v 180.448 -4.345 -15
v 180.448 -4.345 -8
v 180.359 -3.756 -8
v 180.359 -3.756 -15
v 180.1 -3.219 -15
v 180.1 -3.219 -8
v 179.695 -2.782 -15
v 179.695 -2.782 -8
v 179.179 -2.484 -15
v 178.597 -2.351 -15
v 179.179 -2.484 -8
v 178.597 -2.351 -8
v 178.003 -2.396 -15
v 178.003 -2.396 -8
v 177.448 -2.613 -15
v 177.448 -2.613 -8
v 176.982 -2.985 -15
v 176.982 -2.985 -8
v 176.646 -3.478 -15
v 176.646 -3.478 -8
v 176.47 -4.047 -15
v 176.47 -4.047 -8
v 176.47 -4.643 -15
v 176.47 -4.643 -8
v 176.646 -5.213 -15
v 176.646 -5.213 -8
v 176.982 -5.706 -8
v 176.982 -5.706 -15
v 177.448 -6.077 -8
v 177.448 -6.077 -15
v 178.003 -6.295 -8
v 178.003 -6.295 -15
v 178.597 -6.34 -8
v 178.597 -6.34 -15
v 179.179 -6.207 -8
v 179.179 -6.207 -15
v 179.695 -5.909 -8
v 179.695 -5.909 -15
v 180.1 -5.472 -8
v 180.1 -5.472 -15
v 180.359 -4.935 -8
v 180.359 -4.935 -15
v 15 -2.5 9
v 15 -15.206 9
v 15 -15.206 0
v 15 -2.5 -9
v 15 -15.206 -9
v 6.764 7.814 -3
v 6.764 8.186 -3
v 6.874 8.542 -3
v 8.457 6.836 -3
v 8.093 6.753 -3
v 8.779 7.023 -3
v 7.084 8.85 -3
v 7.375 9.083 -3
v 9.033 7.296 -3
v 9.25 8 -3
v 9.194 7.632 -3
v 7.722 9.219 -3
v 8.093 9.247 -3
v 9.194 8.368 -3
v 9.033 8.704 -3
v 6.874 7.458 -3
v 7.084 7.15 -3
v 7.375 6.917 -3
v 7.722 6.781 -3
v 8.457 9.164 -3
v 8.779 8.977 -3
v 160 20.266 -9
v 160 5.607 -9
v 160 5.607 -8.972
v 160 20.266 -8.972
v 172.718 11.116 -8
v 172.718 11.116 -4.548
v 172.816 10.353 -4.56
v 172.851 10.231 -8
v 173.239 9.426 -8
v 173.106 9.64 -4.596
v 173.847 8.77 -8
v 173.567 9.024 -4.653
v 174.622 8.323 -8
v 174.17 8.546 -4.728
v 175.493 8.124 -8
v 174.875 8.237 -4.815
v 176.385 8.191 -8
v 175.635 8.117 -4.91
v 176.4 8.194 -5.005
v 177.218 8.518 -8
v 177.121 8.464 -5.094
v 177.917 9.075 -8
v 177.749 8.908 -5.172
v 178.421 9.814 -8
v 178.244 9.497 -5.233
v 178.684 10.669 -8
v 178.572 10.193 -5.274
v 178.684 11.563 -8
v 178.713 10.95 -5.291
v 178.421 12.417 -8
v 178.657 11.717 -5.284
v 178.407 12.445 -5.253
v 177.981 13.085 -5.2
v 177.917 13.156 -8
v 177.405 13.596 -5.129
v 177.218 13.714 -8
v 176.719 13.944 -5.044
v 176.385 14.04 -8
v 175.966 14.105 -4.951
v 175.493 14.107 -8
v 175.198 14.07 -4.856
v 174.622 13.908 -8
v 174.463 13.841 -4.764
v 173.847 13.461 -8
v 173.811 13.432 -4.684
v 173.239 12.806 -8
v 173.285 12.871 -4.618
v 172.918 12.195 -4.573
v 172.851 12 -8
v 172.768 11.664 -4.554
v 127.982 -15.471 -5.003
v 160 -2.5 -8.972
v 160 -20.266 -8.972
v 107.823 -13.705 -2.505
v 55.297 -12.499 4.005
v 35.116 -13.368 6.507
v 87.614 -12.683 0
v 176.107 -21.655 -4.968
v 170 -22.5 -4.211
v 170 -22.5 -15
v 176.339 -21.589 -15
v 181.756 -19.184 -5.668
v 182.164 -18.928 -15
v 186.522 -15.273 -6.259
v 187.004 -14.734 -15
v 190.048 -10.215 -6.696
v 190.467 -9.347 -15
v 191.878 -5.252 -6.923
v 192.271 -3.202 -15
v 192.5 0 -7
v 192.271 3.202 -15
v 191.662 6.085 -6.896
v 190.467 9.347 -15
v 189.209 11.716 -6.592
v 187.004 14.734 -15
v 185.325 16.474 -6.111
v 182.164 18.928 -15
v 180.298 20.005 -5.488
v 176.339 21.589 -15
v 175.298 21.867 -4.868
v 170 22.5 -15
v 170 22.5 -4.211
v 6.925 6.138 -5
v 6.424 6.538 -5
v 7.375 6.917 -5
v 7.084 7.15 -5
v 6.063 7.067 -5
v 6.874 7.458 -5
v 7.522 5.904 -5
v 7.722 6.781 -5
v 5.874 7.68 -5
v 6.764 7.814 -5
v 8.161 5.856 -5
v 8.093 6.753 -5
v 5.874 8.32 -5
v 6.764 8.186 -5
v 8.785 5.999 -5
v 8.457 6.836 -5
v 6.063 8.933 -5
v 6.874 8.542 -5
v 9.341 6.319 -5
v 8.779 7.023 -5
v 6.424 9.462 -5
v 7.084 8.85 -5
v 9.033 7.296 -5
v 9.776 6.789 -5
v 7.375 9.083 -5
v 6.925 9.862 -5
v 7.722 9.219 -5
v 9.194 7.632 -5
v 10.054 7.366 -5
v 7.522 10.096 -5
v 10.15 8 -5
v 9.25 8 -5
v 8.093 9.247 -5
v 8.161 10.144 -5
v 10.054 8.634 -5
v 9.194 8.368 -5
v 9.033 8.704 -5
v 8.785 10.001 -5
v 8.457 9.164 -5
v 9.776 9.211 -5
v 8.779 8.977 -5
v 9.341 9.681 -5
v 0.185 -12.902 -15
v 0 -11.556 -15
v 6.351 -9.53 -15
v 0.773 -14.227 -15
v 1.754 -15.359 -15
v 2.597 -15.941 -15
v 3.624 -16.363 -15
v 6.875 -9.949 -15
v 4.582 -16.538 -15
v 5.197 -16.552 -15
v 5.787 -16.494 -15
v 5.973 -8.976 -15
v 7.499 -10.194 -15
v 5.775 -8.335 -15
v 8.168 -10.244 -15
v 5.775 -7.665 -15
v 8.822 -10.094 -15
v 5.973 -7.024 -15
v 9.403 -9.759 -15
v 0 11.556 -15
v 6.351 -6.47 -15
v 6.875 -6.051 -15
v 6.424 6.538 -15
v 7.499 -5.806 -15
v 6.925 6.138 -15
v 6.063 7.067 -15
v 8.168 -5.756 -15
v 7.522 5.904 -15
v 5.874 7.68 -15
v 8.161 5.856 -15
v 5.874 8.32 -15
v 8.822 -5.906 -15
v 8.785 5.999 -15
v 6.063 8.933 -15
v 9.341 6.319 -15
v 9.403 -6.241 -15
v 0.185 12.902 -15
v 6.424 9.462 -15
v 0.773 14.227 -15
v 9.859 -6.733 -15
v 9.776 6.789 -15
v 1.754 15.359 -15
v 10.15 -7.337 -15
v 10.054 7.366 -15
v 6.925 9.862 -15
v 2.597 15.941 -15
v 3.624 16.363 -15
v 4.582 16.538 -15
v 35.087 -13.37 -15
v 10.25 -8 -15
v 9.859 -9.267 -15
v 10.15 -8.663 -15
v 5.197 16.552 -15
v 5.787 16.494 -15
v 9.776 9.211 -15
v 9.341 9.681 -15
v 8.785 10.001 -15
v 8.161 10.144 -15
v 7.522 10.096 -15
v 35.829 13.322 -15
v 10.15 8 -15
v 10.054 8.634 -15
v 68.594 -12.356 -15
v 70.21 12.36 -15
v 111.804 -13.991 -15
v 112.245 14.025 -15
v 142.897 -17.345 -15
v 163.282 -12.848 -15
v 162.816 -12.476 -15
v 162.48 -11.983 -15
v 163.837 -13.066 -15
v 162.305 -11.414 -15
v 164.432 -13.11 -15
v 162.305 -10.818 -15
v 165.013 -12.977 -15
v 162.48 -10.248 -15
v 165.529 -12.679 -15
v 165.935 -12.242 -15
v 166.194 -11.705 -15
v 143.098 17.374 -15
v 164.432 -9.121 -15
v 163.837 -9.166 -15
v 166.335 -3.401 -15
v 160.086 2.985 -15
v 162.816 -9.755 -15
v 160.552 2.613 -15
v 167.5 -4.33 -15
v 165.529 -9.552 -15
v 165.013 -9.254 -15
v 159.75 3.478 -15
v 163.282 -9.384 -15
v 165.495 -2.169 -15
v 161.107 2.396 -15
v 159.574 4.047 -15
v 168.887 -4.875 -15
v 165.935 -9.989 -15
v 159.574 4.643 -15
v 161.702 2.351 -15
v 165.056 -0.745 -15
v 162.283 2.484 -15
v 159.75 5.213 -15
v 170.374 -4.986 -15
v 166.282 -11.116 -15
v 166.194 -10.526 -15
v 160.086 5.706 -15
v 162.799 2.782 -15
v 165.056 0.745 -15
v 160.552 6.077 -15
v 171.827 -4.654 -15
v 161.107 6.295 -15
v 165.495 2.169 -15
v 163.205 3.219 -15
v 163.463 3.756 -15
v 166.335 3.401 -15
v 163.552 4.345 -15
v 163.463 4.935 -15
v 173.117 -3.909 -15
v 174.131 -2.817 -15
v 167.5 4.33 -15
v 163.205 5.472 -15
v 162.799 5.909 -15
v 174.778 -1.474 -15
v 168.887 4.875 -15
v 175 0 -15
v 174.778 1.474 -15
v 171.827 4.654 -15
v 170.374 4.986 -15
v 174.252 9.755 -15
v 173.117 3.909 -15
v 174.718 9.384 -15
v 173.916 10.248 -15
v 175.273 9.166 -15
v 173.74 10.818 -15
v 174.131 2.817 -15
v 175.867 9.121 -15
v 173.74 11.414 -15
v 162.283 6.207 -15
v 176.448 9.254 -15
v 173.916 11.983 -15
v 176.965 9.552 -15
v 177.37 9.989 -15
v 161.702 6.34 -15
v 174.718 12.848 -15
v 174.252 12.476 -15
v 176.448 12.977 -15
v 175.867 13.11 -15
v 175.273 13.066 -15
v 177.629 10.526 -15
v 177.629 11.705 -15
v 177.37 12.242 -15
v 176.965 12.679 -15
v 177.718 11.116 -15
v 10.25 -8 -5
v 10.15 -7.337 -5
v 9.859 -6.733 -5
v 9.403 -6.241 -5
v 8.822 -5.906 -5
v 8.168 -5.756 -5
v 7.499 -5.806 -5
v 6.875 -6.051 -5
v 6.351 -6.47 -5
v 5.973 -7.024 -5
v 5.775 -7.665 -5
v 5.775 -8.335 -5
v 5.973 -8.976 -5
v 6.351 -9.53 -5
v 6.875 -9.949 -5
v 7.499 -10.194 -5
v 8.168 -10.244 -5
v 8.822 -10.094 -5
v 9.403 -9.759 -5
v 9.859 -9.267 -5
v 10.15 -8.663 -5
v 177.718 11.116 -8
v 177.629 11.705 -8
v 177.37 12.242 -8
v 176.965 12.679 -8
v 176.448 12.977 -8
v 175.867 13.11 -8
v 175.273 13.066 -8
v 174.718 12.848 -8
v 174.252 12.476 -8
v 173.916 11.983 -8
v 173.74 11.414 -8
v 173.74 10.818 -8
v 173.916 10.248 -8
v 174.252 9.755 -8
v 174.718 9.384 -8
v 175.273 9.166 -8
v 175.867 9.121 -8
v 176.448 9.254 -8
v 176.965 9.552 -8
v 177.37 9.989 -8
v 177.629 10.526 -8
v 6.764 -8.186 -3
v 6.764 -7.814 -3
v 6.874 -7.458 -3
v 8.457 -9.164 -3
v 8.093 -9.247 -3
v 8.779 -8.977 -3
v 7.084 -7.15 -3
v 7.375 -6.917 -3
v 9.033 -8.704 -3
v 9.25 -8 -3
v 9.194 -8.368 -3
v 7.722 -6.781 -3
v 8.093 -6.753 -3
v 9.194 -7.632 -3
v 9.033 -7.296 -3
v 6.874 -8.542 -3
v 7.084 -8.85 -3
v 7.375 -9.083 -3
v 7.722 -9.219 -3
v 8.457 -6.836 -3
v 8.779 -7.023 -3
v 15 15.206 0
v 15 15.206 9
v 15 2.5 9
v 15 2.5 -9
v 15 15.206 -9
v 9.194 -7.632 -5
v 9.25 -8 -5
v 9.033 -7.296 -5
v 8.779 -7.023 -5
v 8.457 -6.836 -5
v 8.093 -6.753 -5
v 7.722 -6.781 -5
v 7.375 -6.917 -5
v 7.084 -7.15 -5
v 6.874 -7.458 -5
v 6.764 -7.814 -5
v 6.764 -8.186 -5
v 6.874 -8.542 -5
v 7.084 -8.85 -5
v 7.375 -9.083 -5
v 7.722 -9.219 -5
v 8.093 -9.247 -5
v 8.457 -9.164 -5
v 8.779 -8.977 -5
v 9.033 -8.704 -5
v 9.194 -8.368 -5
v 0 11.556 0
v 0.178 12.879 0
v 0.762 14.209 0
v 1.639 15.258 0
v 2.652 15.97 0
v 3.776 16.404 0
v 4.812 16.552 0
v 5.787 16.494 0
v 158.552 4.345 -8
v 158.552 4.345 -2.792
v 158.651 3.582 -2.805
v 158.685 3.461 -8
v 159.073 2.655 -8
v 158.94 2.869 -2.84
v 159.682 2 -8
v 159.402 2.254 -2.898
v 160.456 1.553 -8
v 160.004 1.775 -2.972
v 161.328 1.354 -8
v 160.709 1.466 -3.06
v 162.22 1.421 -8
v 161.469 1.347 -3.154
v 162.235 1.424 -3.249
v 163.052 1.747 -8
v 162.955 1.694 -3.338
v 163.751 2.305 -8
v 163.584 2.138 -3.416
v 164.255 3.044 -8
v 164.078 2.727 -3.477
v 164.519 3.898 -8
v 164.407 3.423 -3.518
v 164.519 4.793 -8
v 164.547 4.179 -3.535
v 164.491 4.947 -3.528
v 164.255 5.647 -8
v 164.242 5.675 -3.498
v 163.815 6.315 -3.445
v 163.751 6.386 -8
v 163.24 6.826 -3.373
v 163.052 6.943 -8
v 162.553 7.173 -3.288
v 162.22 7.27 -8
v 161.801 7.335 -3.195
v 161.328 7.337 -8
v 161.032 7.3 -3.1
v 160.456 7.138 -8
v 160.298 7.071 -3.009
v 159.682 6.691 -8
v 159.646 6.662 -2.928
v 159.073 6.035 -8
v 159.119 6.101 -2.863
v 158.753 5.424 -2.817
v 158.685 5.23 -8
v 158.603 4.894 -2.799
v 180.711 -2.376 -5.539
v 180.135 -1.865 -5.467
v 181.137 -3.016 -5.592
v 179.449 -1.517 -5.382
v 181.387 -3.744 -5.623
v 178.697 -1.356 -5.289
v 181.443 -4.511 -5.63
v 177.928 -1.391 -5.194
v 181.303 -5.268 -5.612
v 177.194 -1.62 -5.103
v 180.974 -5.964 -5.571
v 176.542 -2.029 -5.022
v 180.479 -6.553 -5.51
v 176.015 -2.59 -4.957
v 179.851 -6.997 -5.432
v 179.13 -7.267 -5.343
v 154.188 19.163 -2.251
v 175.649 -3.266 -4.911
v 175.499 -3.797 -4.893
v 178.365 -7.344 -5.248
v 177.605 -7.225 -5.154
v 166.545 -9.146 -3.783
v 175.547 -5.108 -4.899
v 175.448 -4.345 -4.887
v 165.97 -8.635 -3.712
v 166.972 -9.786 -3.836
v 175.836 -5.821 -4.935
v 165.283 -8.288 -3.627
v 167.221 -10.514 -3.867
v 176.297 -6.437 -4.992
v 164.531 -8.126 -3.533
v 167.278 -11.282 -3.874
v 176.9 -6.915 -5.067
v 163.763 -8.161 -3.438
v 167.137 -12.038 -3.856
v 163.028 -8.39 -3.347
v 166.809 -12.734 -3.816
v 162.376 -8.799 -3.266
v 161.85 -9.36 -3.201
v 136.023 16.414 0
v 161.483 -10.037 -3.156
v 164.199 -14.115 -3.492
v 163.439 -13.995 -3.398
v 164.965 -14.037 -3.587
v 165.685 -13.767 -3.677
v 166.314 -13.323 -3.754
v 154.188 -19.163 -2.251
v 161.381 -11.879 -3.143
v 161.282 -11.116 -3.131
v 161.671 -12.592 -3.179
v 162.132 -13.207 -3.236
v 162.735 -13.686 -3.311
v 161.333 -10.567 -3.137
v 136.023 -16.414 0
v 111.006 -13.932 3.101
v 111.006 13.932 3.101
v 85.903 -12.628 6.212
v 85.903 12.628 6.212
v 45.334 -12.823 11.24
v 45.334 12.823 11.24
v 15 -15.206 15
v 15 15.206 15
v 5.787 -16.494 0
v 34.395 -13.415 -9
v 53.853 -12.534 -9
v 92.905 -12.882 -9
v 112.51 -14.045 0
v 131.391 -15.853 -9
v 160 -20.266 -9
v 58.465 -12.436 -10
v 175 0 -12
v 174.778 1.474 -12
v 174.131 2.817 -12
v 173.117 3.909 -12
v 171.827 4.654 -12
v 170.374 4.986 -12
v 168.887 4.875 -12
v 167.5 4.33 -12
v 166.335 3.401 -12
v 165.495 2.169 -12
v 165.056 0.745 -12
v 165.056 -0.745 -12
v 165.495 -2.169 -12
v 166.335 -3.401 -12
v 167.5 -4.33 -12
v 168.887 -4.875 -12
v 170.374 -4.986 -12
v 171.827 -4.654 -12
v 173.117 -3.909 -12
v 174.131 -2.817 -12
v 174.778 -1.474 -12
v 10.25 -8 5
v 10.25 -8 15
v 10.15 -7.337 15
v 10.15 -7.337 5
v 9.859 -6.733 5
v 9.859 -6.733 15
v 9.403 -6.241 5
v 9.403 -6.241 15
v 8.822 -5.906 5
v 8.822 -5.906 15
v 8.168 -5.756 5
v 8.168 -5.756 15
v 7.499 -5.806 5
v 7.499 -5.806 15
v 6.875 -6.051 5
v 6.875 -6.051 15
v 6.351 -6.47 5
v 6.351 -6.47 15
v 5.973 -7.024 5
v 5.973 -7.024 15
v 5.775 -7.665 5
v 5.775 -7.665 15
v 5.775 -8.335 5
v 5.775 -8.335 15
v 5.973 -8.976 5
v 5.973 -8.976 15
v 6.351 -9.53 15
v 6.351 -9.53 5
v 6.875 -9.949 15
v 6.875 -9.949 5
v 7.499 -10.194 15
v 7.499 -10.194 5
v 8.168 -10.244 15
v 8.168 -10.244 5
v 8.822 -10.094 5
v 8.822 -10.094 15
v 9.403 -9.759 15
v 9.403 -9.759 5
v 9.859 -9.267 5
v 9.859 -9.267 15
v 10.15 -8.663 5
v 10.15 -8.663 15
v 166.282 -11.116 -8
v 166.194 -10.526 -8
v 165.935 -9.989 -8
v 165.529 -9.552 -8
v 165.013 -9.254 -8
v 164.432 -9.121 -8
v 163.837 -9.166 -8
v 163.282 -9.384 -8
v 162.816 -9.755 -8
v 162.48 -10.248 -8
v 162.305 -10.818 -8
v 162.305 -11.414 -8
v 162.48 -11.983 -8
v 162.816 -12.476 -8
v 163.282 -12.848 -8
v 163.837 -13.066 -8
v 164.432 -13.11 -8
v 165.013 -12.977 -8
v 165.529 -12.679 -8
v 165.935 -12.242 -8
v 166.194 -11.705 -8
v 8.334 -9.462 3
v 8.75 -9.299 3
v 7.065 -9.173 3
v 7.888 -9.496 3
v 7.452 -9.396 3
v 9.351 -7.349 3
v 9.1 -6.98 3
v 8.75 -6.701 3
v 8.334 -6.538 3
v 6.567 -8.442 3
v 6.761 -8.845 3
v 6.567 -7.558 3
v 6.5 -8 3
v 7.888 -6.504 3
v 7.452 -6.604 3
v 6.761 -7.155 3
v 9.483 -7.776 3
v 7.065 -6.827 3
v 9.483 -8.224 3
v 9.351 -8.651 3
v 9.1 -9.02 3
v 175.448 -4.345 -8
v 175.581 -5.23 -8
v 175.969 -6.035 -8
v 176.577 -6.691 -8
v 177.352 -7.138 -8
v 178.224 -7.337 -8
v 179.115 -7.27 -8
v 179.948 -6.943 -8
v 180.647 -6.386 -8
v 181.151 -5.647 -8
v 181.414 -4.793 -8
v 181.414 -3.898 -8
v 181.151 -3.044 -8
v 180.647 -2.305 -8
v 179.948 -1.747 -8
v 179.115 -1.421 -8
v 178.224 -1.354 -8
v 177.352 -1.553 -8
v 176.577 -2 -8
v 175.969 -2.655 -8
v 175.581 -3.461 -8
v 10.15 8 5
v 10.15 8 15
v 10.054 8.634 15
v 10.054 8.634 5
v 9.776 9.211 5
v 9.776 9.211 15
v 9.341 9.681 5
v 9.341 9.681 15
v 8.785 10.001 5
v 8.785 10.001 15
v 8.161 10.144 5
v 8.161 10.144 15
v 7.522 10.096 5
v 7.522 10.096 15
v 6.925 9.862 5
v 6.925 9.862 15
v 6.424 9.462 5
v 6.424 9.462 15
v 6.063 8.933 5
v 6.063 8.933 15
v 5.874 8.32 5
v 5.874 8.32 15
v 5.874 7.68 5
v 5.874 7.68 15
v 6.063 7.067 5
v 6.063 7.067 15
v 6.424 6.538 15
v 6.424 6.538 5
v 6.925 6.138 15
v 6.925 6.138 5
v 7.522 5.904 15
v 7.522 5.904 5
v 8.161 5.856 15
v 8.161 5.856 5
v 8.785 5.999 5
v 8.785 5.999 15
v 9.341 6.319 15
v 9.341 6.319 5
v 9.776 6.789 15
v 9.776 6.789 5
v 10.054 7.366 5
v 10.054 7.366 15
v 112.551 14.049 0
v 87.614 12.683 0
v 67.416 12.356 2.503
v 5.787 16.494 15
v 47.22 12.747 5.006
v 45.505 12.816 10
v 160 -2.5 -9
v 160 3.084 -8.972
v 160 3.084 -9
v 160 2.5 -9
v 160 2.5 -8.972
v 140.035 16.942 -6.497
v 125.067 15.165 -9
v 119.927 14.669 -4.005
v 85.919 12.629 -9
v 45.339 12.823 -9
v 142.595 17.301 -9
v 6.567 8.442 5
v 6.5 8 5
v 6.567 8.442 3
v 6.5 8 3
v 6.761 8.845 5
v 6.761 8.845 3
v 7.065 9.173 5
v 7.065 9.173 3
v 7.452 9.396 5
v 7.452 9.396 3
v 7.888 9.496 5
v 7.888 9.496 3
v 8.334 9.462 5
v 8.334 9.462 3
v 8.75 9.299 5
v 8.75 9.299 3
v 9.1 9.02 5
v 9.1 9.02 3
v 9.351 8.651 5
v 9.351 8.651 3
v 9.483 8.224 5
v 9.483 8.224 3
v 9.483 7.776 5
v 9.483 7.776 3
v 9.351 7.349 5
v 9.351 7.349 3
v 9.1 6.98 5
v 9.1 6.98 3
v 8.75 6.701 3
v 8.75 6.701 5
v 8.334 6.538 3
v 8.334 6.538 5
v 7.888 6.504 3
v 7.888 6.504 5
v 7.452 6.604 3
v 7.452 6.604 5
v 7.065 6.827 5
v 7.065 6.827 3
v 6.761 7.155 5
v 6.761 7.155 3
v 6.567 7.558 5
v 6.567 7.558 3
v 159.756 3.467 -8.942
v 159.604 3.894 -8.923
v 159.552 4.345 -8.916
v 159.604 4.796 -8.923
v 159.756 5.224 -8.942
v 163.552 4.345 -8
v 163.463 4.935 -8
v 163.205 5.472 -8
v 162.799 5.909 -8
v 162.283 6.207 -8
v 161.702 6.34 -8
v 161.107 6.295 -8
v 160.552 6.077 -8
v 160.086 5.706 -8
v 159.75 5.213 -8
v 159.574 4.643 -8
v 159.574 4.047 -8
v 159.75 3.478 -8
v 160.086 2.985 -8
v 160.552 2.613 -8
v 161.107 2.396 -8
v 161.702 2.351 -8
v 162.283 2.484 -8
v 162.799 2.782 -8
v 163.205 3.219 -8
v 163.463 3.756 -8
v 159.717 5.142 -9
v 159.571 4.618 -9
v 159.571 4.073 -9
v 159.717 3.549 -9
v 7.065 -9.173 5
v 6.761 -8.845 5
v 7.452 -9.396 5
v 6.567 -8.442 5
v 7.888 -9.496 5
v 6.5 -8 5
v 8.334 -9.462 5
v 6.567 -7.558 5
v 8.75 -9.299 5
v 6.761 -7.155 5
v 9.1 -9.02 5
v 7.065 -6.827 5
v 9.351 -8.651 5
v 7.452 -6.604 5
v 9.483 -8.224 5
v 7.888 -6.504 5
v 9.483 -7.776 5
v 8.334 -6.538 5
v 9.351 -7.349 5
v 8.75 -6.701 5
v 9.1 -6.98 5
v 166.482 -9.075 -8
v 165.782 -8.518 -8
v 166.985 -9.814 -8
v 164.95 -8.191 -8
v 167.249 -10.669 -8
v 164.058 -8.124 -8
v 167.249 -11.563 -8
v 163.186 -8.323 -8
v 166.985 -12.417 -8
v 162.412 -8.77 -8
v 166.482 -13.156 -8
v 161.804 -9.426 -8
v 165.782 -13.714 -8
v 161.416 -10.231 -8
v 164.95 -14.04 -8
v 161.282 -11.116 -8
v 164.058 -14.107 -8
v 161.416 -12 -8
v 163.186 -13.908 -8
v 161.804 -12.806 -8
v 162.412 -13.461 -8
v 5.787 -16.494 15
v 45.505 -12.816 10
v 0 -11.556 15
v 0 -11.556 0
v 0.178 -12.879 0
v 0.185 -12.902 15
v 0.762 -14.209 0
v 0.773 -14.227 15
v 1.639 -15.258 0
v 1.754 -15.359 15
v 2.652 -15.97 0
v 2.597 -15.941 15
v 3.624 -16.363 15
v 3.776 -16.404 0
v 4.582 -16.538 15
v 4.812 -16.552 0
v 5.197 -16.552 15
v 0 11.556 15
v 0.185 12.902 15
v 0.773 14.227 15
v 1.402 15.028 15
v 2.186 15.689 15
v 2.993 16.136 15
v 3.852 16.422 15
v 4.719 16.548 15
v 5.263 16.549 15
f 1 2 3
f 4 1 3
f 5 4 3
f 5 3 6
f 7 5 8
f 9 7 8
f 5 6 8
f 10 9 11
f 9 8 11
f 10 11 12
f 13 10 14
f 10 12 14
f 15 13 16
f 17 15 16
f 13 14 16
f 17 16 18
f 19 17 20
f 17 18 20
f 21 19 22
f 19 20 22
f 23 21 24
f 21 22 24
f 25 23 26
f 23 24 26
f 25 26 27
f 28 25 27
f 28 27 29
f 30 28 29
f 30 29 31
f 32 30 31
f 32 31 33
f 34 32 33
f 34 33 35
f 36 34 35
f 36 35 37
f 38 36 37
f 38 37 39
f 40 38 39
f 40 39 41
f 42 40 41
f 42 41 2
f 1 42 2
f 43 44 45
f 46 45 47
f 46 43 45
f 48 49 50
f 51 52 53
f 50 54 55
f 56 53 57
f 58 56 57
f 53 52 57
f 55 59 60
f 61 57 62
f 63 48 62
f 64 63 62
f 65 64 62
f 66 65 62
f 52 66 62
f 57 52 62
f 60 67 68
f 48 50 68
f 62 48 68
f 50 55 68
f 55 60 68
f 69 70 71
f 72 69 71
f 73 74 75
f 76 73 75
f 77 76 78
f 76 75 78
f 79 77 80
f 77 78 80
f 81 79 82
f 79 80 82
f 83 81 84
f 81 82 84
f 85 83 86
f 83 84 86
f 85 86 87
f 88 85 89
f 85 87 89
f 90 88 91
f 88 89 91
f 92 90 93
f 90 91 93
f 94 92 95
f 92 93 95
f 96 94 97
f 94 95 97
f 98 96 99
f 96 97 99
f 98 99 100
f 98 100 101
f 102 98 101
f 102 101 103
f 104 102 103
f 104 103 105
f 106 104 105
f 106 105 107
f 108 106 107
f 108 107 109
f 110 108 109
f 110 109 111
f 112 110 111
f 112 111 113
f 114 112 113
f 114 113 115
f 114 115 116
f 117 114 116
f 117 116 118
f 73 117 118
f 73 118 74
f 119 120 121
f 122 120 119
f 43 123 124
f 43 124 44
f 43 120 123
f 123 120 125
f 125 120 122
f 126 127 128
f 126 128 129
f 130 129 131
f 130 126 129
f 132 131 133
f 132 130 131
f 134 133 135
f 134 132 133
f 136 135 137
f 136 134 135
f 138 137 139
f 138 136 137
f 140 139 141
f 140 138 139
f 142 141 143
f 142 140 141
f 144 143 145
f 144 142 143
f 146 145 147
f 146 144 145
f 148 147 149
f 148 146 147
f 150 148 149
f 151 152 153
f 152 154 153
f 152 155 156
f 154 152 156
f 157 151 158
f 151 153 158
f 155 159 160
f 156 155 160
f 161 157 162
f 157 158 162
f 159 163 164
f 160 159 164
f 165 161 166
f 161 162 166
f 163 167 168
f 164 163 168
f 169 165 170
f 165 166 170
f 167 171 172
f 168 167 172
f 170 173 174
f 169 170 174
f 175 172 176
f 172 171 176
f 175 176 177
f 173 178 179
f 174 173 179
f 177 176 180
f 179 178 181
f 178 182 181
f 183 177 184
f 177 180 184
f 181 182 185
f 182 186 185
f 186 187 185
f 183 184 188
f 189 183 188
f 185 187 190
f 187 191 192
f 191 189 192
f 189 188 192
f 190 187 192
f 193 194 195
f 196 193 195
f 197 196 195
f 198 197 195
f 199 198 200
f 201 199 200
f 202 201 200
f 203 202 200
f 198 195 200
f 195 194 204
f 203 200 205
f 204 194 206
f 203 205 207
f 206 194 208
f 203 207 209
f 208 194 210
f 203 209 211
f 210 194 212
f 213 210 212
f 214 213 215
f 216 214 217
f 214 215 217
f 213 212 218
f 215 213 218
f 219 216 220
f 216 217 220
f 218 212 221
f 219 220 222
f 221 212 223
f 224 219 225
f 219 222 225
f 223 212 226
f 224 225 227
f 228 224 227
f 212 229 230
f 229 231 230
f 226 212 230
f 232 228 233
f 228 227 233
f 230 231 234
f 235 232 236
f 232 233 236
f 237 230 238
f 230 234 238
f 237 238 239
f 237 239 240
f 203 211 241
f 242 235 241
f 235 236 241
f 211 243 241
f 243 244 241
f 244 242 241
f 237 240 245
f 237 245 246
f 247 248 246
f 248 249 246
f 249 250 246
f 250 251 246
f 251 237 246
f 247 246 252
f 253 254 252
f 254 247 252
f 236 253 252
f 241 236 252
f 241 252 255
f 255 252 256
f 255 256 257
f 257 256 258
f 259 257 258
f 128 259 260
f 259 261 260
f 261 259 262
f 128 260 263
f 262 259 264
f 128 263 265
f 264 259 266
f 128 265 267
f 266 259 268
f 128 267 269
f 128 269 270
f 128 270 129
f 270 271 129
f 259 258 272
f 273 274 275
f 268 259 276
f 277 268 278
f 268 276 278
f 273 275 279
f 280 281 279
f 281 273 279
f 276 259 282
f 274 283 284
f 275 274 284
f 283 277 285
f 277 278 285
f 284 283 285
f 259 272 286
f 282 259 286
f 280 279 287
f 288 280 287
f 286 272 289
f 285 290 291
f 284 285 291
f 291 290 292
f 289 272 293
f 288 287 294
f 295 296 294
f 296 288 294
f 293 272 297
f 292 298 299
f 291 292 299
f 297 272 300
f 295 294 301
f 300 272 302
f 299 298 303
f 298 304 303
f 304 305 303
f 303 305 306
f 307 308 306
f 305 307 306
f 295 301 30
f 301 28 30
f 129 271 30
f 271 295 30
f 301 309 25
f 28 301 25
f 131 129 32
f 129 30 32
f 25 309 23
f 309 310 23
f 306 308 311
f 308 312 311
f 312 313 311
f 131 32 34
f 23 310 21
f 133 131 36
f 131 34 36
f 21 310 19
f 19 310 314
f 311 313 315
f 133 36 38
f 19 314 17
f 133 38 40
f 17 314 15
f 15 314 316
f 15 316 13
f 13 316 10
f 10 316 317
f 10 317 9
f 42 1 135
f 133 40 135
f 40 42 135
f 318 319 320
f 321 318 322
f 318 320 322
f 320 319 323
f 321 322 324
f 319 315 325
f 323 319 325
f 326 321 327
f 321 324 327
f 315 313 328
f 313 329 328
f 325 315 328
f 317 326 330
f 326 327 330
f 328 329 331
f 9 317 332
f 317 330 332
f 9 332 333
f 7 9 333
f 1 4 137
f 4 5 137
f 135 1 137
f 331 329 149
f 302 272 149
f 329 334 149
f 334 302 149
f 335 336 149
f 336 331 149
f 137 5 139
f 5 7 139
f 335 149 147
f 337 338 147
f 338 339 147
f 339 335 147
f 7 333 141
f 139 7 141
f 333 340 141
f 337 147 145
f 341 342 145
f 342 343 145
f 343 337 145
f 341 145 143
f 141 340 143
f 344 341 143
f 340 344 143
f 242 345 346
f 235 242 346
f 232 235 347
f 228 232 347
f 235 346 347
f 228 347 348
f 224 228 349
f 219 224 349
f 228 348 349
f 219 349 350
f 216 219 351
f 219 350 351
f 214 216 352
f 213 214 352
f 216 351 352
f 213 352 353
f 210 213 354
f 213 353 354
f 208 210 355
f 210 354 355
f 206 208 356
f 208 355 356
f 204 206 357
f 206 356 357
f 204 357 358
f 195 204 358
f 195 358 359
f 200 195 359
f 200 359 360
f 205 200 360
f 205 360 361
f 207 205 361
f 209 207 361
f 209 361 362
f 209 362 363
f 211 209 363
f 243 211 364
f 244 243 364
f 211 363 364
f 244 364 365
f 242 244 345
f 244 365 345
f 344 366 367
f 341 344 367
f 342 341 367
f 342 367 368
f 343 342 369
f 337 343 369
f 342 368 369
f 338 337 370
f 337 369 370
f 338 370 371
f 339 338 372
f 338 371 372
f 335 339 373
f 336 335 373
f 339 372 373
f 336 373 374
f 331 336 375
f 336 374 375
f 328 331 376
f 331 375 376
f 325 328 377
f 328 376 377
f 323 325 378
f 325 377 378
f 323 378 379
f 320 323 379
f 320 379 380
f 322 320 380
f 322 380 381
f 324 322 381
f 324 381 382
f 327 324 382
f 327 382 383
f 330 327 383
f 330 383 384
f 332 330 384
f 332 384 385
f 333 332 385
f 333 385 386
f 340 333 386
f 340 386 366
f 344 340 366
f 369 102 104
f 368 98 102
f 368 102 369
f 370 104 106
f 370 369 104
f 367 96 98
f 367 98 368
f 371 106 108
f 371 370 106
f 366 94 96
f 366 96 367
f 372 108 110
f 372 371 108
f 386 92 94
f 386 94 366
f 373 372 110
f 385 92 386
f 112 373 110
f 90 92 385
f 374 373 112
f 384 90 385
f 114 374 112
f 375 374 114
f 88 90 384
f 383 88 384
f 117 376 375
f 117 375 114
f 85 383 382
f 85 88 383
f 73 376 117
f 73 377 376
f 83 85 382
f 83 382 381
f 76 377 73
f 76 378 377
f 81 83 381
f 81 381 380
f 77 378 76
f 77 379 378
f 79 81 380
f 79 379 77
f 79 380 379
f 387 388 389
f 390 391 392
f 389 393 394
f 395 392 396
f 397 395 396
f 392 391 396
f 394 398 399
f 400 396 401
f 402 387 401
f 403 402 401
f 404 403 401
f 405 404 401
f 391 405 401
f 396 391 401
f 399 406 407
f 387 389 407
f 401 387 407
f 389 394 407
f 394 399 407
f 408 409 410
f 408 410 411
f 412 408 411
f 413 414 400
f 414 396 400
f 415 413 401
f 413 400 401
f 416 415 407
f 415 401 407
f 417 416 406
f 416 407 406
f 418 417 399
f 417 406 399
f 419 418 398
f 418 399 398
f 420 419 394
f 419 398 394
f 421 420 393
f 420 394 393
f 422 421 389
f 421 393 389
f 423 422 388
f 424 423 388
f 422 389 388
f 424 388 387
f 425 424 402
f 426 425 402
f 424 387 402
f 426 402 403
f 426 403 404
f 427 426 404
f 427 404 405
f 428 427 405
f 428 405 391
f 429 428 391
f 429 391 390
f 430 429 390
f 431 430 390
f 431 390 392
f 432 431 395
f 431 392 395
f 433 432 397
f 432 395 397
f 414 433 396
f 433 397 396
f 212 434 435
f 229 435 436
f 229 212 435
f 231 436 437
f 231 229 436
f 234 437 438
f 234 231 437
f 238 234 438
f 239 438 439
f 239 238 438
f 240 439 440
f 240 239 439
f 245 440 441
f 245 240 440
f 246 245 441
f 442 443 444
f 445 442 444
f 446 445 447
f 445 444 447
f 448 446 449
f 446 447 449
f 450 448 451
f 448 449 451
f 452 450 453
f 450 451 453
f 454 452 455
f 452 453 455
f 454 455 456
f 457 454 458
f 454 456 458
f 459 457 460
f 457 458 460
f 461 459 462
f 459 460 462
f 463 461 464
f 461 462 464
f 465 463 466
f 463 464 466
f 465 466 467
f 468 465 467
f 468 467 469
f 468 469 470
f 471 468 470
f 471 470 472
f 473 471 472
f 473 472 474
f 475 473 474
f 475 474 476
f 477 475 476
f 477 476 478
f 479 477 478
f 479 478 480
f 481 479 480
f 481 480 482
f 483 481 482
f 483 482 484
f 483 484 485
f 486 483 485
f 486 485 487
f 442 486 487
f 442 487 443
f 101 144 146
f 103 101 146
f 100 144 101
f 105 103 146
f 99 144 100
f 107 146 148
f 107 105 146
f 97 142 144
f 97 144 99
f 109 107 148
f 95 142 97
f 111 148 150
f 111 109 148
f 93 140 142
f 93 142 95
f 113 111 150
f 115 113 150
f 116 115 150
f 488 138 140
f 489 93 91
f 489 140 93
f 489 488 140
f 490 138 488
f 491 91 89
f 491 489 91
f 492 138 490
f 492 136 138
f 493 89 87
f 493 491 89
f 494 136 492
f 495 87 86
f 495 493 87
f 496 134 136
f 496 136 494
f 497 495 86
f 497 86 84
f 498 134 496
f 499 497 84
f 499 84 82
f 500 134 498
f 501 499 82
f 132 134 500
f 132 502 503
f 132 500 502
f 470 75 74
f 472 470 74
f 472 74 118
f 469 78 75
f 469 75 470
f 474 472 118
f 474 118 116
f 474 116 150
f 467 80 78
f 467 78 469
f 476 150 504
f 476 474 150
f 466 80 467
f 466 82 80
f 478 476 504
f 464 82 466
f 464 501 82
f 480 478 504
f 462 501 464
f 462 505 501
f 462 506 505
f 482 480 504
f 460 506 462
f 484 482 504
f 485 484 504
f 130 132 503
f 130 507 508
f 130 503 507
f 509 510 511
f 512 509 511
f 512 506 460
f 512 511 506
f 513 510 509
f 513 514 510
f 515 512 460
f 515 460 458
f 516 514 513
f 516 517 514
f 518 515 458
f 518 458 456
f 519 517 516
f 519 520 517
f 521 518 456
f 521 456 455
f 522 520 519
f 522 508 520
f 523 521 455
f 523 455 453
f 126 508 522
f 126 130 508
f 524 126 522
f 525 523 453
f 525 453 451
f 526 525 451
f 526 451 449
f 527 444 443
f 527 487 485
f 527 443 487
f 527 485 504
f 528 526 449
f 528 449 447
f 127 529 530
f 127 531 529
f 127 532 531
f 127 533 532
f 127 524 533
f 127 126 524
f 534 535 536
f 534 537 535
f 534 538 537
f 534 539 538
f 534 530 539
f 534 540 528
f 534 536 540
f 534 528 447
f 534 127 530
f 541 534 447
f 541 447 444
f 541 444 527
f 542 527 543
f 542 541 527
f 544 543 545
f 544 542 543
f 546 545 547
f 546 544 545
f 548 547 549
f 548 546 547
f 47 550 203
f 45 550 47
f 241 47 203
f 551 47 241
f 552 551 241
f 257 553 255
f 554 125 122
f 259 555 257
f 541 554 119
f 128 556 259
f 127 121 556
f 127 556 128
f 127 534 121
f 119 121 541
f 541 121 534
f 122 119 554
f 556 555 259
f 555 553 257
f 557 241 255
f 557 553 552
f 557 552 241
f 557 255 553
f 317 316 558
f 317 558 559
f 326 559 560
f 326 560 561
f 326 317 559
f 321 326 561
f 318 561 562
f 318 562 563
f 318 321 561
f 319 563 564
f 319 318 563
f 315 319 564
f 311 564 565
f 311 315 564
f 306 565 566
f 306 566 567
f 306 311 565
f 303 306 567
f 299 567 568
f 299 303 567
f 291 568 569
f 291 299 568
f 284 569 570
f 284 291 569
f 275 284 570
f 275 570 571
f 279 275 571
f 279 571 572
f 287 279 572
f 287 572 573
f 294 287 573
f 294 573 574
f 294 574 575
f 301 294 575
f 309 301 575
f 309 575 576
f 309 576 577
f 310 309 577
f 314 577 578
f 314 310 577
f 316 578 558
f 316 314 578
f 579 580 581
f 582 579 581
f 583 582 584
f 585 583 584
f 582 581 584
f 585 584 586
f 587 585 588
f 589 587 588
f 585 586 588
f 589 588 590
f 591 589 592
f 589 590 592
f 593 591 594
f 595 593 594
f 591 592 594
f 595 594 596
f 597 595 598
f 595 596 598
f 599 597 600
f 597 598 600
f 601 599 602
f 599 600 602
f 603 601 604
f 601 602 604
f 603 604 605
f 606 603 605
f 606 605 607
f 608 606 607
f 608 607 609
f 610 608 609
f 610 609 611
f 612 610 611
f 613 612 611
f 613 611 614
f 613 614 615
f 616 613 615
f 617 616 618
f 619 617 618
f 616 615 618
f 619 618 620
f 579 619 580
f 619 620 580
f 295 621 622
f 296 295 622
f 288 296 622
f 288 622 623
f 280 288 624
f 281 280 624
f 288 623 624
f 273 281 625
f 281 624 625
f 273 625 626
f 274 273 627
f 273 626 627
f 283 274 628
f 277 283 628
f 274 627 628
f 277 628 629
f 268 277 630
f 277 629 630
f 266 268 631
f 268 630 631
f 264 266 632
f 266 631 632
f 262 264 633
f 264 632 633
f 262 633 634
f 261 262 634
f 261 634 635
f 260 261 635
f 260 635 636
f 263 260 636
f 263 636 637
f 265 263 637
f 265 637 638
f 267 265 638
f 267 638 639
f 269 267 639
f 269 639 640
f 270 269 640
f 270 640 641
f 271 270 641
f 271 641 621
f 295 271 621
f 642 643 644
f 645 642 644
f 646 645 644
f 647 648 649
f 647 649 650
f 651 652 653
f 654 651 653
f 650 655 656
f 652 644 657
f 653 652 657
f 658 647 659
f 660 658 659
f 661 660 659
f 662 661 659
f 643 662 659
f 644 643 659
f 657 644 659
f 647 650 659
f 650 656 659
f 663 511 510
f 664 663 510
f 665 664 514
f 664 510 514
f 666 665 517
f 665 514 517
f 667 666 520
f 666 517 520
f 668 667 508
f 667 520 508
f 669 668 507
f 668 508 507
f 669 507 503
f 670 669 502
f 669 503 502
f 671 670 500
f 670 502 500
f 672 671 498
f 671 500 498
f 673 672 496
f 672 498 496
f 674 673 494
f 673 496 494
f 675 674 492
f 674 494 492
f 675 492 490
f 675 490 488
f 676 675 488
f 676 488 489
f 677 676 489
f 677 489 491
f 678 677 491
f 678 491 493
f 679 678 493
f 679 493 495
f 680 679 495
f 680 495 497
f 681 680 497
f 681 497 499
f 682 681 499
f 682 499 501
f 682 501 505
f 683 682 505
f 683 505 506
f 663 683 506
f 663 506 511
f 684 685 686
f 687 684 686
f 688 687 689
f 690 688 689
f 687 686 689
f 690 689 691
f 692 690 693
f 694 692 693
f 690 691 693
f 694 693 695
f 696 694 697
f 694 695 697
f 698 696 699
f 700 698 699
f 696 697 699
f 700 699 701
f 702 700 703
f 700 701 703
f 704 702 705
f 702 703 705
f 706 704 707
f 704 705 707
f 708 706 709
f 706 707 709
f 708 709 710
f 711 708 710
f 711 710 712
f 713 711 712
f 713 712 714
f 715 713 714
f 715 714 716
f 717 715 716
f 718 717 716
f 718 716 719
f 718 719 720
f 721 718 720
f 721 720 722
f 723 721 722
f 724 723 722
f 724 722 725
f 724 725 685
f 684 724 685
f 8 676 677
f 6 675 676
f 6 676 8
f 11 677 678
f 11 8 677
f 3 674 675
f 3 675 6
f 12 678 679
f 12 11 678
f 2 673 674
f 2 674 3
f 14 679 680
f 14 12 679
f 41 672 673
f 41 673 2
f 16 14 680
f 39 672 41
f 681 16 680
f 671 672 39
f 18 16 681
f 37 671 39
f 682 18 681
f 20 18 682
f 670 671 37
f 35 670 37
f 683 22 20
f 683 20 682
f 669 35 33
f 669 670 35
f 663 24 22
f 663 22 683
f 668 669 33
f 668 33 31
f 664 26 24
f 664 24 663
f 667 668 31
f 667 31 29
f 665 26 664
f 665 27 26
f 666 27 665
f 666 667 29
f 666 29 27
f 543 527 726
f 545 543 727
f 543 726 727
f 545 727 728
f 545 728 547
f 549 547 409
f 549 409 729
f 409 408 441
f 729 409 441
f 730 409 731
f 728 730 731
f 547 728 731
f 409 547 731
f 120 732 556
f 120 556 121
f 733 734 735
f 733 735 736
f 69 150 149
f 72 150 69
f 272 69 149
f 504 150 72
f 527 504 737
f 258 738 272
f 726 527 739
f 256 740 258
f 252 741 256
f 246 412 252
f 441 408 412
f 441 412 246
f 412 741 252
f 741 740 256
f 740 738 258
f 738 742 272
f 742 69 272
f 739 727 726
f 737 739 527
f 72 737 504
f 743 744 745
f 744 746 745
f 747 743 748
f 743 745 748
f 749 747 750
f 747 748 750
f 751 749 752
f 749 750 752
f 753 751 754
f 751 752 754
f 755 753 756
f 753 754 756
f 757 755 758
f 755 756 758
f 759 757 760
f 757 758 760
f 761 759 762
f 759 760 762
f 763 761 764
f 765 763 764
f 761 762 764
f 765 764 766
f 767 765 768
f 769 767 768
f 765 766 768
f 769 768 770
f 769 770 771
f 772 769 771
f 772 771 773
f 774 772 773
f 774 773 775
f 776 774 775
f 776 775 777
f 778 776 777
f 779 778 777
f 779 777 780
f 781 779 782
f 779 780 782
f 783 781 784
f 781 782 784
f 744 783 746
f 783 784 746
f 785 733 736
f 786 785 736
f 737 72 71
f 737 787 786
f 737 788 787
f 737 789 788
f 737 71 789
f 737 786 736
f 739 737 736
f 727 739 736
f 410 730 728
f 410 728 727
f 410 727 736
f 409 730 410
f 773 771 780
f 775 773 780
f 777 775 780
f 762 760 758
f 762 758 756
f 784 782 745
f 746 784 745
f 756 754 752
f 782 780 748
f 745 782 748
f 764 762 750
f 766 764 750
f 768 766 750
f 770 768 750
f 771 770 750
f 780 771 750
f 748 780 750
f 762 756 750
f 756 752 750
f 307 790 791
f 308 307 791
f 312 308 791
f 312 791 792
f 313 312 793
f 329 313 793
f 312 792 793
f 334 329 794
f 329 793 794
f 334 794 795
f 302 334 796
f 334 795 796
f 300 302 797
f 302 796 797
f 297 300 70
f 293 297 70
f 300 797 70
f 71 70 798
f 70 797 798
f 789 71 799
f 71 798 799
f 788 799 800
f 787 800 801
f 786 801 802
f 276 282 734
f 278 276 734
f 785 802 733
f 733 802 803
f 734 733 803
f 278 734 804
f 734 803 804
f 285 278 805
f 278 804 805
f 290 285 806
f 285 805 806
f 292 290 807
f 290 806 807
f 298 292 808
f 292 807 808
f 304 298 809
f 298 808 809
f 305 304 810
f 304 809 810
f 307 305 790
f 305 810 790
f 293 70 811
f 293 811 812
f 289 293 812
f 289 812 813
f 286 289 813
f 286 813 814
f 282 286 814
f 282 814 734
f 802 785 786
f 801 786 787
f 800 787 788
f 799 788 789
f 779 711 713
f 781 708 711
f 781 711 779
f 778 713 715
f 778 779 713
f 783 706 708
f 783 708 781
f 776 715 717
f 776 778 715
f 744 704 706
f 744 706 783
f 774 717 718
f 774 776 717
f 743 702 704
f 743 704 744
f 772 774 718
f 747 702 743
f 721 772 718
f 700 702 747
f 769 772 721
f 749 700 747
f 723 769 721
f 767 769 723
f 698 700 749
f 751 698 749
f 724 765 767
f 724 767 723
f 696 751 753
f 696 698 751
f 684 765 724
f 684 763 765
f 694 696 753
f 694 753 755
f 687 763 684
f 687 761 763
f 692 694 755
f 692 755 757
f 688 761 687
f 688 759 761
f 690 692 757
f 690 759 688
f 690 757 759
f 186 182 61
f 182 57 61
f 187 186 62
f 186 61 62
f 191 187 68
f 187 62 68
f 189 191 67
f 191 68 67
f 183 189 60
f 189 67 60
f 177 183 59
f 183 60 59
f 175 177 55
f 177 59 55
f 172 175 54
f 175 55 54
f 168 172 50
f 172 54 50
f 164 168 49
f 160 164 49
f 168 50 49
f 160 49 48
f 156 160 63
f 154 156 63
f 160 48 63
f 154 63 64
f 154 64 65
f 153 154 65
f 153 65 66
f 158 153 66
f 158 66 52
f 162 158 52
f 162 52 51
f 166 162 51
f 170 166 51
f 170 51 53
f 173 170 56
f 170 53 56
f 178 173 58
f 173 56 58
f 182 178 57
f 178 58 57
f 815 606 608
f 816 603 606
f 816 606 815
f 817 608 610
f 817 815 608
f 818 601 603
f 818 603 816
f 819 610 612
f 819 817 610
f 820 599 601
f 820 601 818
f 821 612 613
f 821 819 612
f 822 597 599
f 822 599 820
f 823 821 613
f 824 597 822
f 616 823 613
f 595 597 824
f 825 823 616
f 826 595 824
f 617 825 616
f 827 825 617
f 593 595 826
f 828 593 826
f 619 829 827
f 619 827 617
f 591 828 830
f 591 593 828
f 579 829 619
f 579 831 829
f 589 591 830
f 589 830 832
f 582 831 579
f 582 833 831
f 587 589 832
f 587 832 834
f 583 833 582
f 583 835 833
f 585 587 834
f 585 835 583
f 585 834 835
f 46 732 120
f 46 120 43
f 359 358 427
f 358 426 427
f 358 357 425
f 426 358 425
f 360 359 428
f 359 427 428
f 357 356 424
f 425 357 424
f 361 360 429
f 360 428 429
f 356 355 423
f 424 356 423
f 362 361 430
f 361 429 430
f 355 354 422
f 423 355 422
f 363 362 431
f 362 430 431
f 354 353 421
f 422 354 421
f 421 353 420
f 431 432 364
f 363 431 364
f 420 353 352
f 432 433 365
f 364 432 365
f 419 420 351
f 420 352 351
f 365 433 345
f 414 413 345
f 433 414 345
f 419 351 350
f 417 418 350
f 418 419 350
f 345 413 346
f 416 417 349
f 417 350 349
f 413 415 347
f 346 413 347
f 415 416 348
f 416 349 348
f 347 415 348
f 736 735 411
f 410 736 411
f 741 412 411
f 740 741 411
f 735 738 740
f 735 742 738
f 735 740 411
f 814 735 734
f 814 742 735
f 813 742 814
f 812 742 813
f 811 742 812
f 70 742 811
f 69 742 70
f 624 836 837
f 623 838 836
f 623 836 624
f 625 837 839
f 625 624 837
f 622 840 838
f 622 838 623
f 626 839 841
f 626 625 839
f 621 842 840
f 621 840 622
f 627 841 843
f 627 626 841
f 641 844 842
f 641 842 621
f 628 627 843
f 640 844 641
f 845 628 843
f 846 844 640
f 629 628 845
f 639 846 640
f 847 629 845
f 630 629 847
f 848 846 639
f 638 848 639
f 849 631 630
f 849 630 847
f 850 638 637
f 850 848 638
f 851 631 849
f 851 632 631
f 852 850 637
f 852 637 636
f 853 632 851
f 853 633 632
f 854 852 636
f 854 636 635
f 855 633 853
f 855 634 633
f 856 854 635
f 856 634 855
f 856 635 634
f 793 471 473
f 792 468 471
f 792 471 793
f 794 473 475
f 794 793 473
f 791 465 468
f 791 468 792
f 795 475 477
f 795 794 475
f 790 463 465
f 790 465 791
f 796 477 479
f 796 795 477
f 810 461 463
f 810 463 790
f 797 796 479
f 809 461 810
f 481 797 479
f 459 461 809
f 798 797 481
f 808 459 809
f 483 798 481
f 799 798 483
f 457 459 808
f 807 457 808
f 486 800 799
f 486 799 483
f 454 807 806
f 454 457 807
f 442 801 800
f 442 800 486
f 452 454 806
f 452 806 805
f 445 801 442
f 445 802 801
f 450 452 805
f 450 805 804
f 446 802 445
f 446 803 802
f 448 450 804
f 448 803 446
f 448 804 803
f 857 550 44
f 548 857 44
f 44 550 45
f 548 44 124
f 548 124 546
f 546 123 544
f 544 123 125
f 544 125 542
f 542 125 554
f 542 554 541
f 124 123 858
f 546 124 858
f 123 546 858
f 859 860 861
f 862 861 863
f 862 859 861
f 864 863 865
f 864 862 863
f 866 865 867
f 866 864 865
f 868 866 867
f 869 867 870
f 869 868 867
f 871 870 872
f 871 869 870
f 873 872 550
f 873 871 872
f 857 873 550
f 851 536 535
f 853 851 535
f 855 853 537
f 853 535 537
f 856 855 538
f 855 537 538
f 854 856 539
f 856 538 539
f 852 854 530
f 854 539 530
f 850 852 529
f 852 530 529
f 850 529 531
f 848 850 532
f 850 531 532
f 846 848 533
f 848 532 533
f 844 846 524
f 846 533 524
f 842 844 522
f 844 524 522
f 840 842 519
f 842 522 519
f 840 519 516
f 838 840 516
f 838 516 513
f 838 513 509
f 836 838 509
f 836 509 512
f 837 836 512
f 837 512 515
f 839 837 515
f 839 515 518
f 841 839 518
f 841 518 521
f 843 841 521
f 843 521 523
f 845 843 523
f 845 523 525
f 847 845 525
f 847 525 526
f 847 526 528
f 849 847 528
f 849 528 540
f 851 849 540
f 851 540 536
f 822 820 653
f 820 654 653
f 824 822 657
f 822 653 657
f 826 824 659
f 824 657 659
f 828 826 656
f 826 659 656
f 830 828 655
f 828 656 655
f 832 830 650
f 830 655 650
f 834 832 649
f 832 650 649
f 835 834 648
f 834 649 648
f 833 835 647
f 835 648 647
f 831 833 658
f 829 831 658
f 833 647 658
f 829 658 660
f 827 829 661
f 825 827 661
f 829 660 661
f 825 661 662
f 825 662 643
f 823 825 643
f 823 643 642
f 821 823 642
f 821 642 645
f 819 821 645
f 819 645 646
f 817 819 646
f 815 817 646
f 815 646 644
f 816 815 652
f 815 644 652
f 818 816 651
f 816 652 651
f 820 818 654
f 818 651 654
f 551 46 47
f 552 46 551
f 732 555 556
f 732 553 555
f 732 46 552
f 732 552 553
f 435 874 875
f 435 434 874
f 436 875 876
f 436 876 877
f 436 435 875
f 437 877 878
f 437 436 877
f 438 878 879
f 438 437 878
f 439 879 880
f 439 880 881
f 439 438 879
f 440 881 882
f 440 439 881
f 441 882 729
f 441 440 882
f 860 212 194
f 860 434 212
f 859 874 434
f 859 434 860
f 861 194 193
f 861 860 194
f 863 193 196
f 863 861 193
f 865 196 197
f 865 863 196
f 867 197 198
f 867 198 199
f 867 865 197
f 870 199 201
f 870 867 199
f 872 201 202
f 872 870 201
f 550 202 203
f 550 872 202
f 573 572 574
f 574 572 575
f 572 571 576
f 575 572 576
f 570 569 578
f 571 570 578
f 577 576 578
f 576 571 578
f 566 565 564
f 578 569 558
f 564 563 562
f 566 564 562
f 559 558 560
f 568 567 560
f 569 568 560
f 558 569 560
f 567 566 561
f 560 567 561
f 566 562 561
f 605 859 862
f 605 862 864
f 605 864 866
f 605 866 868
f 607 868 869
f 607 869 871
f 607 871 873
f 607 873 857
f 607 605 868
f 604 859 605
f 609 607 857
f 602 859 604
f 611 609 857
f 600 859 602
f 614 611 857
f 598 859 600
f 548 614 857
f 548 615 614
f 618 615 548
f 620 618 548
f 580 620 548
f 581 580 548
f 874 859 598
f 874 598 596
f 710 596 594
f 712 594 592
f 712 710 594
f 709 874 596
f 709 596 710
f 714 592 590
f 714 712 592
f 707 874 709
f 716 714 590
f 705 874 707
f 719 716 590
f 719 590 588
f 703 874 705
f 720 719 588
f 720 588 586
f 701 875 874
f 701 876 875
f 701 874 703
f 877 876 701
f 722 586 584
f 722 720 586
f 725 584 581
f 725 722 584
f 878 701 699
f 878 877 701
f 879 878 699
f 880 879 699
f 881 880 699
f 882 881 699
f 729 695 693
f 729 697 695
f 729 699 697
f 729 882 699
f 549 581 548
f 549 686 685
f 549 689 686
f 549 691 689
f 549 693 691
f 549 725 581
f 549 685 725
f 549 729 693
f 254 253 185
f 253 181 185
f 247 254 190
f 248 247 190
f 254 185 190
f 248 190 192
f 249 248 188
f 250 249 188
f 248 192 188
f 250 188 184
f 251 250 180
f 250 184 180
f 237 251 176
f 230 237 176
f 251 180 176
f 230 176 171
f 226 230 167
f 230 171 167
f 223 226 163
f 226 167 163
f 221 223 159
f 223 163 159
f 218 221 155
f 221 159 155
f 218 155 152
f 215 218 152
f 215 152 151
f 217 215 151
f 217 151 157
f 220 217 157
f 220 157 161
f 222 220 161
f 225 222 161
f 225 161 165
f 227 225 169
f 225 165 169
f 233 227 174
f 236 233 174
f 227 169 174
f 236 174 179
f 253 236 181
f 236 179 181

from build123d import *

# Parameters (mm, degrees)
SKETCH1_R                                        = 2
BOSS_EXTRUDE1_DEPTH                              = 15
CUT_EXTRUDE7_START                               = 15
SKETCH1_3_R                                      = 5
CUT_EXTRUDE7_DEPTH                               = 4
CUT_EXTRUDE2_START                               = -22.5000001
CUT_EXTRUDE2_DEPTH                               = 45.0000001
CUT_EXTRUDE6_DEPTH                               = 30
CBORE_FOR_M3_HEX_HEAD_MACHINE_SCREW3_D           = 3
CBORE_FOR_M3_HEX_HEAD_MACHINE_SCREW3_DEPTH       = 25
CBORE_FOR_M3_HEX_HEAD_MACHINE_SCREW3_CBORE_D     = 6
CBORE_FOR_M3_HEX_HEAD_MACHINE_SCREW3_CBORE_DEPTH = 18
CBORE_FOR_M3_HEX_HEAD_MACHINE_SCREW3_TIP         = 0.901290929
CUT_EXTRUDE4_START                               = 15
SKETCH19_R                                       = 2.15
SKETCH19_R_2                                     = 2.25
CUT_EXTRUDE4_DEPTH                               = 10
CUT_EXTRUDE5_START                               = -5
SKETCH19_2_R                                     = 2.15
SKETCH19_2_R_2                                   = 2.25
CUT_EXTRUDE5_DEPTH                               = 10
BOSS_EXTRUDE3_DEPTH                              = 2.5
CBORE_FOR_M3_SHCS2_D                             = 3
CBORE_FOR_M3_SHCS2_DEPTH                         = 12
CBORE_FOR_M3_SHCS2_CBORE_D                       = 4.3
CBORE_FOR_M3_SHCS2_CBORE_DEPTH                   = 5.2
CBORE_FOR_M3_SHCS3_D                             = 2.5
CBORE_FOR_M3_SHCS3_DEPTH                         = 12
CBORE_FOR_M3_SHCS3_CBORE_D                       = 4.3
CBORE_FOR_M3_SHCS3_CBORE_DEPTH                   = 5.2
FILLET2_R                                        = 5
CUT_EXTRUDE9_START                               = -15
SKETCH1_5_R                                      = 5
CUT_EXTRUDE9_DEPTH                               = 3


# Read off the part's stored shape, not the designer's step: Cut-Extrude2
with BuildPart() as part:
    # Sketch1 → Boss-Extrude1 (new, symmetric)
    with BuildSketch(Plane.XY):
        with BuildLine():
            Line((0, 17.5), (0, -17.5))
            add(Edge.make_bspline(
                [(0, -17.5), (43.884108447, -9.177006937), (123.842028205, -11.029704256), (170, -22.5)],
                knots=[0, 0, 0, 0, 1, 1, 1, 1], degree=3))
            ThreePointArc((170, -22.5), (192.5, 0), (170, 22.5))
            add(Edge.make_bspline(
                [(170, 22.5), (123.842028205, 11.029704256), (43.884108447, 9.177006937), (0, 17.5)],
                knots=[0.933681919, 0.933681919, 0.933681919, 0.933681919, 1.933681919, 1.933681919, 1.933681919, 1.933681919], degree=3))
        make_face()
        with Locations((175.71763899, 11.115691808)):
            Circle(SKETCH1_R, mode=Mode.SUBTRACT)
        with Locations((164.28236101, -11.115691808)):
            Circle(SKETCH1_R, mode=Mode.SUBTRACT)
        with Locations((178.447925774, -4.345405633)):
            Circle(SKETCH1_R, mode=Mode.SUBTRACT)
        with Locations((161.552074226, 4.345405633)):
            Circle(SKETCH1_R, mode=Mode.SUBTRACT)
    extrude(amount=BOSS_EXTRUDE1_DEPTH, both=True)

    # Sketch1<3> → Cut-Extrude7 (cut)
    with BuildSketch(Plane.XY.offset(CUT_EXTRUDE7_START)):
        with Locations((170, 0)):
            Circle(SKETCH1_3_R)
    extrude(amount=-CUT_EXTRUDE7_DEPTH, mode=Mode.SUBTRACT)

    # Cut-Extrude2 outline → Cut-Extrude2 (cut)
    with BuildSketch(Plane(origin=(0, 0, 0), x_dir=(1, 0, 0), z_dir=(0, 1, 0)).offset(CUT_EXTRUDE2_START)):
        Polygon((14.999999991, -15.000000001), (194, -15), (194, 7.185915493), (192.500000099, 7.000000012), align=None)
    extrude(amount=CUT_EXTRUDE2_DEPTH, mode=Mode.SUBTRACT)

    # Sketch20 → Cut-Extrude6 (cut, symmetric)
    with BuildSketch(Plane(origin=(0, 0, 0), x_dir=(1, 0, 0), z_dir=(0, 1, 0))):
        Polygon((15, -9), (15, 9), (160, 9), (160, 8.971830985), align=None)
    extrude(amount=CUT_EXTRUDE6_DEPTH, both=True, mode=Mode.SUBTRACT)

    # CBORE for M3 Hex Head Machine Screw3
    with Locations(Plane(origin=(0, 0, 10), x_dir=(-1, 0, 0), z_dir=(0, 0, 1))):
        with Locations((-175.71763899, -11.115691808), (-161.552074226, -4.345405633), (-164.28236101, 11.115691808), (-178.447925774, 4.345405633)):
            CounterBoreHole(CBORE_FOR_M3_HEX_HEAD_MACHINE_SCREW3_D / 2, CBORE_FOR_M3_HEX_HEAD_MACHINE_SCREW3_CBORE_D / 2, CBORE_FOR_M3_HEX_HEAD_MACHINE_SCREW3_CBORE_DEPTH, depth=CBORE_FOR_M3_HEX_HEAD_MACHINE_SCREW3_DEPTH)
            with Locations((0, 0, -(CBORE_FOR_M3_HEX_HEAD_MACHINE_SCREW3_DEPTH + CBORE_FOR_M3_HEX_HEAD_MACHINE_SCREW3_TIP / 2))):  # 118° drill point
                Cone(0, CBORE_FOR_M3_HEX_HEAD_MACHINE_SCREW3_D / 2, CBORE_FOR_M3_HEX_HEAD_MACHINE_SCREW3_TIP, mode=Mode.SUBTRACT)

    # Sketch19 → Cut-Extrude4 (cut)
    with BuildSketch(Plane.XY.offset(CUT_EXTRUDE4_START)):
        with Locations((8, 8)):
            Circle(SKETCH19_R)
        with Locations((8, -8)):
            Circle(SKETCH19_R_2)
    extrude(amount=-CUT_EXTRUDE4_DEPTH, mode=Mode.SUBTRACT)

    # Sketch19<2> → Cut-Extrude5 (cut)
    with BuildSketch(Plane.XY.offset(CUT_EXTRUDE5_START)):
        with Locations((8, 8)):
            Circle(SKETCH19_2_R)
        with Locations((8, -8)):
            Circle(SKETCH19_2_R_2)
    extrude(amount=-CUT_EXTRUDE5_DEPTH, mode=Mode.SUBTRACT)

    # Sketch20<3> → Boss-Extrude3 (add, symmetric)
    with BuildSketch(Plane(origin=(0, 0, 0), x_dir=(1, 0, 0), z_dir=(0, 1, 0))):
        Polygon((15, -9), (15, 9), (160, 9), (160, 8.971830985), align=None)
    extrude(amount=BOSS_EXTRUDE3_DEPTH, both=True)

    # CBORE for M3 SHCS2
    with Locations(Plane.XY.offset(15)):
        with Locations((8, 8), (8, -8)):
            CounterBoreHole(CBORE_FOR_M3_SHCS2_D / 2, CBORE_FOR_M3_SHCS2_CBORE_D / 2, CBORE_FOR_M3_SHCS2_CBORE_DEPTH, depth=CBORE_FOR_M3_SHCS2_DEPTH)

    # CBORE for M3 SHCS3
    with Locations(Plane(origin=(0, 0, -15), x_dir=(-1, 0, 0), z_dir=(0, 0, -1))):
        with Locations((-8, 8), (-8, -8)):
            CounterBoreHole(CBORE_FOR_M3_SHCS3_D / 2, CBORE_FOR_M3_SHCS3_CBORE_D / 2, CBORE_FOR_M3_SHCS3_CBORE_DEPTH, depth=CBORE_FOR_M3_SHCS3_DEPTH)

    # Fillet2
    fillet2_edges = [part.edges().sort_by_distance(p)[0] for p in [
        (0, 17.5, -7.5),
        (0, -17.5, 7.5),
    ]]
    fillet(fillet2_edges, radius=FILLET2_R)

    # Sketch1<5> → Cut-Extrude9 (cut)
    with BuildSketch(Plane.XY.offset(CUT_EXTRUDE9_START)):
        with Locations((170, 0)):
            Circle(SKETCH1_5_R)
    extrude(amount=CUT_EXTRUDE9_DEPTH, mode=Mode.SUBTRACT)


solid = part.part
